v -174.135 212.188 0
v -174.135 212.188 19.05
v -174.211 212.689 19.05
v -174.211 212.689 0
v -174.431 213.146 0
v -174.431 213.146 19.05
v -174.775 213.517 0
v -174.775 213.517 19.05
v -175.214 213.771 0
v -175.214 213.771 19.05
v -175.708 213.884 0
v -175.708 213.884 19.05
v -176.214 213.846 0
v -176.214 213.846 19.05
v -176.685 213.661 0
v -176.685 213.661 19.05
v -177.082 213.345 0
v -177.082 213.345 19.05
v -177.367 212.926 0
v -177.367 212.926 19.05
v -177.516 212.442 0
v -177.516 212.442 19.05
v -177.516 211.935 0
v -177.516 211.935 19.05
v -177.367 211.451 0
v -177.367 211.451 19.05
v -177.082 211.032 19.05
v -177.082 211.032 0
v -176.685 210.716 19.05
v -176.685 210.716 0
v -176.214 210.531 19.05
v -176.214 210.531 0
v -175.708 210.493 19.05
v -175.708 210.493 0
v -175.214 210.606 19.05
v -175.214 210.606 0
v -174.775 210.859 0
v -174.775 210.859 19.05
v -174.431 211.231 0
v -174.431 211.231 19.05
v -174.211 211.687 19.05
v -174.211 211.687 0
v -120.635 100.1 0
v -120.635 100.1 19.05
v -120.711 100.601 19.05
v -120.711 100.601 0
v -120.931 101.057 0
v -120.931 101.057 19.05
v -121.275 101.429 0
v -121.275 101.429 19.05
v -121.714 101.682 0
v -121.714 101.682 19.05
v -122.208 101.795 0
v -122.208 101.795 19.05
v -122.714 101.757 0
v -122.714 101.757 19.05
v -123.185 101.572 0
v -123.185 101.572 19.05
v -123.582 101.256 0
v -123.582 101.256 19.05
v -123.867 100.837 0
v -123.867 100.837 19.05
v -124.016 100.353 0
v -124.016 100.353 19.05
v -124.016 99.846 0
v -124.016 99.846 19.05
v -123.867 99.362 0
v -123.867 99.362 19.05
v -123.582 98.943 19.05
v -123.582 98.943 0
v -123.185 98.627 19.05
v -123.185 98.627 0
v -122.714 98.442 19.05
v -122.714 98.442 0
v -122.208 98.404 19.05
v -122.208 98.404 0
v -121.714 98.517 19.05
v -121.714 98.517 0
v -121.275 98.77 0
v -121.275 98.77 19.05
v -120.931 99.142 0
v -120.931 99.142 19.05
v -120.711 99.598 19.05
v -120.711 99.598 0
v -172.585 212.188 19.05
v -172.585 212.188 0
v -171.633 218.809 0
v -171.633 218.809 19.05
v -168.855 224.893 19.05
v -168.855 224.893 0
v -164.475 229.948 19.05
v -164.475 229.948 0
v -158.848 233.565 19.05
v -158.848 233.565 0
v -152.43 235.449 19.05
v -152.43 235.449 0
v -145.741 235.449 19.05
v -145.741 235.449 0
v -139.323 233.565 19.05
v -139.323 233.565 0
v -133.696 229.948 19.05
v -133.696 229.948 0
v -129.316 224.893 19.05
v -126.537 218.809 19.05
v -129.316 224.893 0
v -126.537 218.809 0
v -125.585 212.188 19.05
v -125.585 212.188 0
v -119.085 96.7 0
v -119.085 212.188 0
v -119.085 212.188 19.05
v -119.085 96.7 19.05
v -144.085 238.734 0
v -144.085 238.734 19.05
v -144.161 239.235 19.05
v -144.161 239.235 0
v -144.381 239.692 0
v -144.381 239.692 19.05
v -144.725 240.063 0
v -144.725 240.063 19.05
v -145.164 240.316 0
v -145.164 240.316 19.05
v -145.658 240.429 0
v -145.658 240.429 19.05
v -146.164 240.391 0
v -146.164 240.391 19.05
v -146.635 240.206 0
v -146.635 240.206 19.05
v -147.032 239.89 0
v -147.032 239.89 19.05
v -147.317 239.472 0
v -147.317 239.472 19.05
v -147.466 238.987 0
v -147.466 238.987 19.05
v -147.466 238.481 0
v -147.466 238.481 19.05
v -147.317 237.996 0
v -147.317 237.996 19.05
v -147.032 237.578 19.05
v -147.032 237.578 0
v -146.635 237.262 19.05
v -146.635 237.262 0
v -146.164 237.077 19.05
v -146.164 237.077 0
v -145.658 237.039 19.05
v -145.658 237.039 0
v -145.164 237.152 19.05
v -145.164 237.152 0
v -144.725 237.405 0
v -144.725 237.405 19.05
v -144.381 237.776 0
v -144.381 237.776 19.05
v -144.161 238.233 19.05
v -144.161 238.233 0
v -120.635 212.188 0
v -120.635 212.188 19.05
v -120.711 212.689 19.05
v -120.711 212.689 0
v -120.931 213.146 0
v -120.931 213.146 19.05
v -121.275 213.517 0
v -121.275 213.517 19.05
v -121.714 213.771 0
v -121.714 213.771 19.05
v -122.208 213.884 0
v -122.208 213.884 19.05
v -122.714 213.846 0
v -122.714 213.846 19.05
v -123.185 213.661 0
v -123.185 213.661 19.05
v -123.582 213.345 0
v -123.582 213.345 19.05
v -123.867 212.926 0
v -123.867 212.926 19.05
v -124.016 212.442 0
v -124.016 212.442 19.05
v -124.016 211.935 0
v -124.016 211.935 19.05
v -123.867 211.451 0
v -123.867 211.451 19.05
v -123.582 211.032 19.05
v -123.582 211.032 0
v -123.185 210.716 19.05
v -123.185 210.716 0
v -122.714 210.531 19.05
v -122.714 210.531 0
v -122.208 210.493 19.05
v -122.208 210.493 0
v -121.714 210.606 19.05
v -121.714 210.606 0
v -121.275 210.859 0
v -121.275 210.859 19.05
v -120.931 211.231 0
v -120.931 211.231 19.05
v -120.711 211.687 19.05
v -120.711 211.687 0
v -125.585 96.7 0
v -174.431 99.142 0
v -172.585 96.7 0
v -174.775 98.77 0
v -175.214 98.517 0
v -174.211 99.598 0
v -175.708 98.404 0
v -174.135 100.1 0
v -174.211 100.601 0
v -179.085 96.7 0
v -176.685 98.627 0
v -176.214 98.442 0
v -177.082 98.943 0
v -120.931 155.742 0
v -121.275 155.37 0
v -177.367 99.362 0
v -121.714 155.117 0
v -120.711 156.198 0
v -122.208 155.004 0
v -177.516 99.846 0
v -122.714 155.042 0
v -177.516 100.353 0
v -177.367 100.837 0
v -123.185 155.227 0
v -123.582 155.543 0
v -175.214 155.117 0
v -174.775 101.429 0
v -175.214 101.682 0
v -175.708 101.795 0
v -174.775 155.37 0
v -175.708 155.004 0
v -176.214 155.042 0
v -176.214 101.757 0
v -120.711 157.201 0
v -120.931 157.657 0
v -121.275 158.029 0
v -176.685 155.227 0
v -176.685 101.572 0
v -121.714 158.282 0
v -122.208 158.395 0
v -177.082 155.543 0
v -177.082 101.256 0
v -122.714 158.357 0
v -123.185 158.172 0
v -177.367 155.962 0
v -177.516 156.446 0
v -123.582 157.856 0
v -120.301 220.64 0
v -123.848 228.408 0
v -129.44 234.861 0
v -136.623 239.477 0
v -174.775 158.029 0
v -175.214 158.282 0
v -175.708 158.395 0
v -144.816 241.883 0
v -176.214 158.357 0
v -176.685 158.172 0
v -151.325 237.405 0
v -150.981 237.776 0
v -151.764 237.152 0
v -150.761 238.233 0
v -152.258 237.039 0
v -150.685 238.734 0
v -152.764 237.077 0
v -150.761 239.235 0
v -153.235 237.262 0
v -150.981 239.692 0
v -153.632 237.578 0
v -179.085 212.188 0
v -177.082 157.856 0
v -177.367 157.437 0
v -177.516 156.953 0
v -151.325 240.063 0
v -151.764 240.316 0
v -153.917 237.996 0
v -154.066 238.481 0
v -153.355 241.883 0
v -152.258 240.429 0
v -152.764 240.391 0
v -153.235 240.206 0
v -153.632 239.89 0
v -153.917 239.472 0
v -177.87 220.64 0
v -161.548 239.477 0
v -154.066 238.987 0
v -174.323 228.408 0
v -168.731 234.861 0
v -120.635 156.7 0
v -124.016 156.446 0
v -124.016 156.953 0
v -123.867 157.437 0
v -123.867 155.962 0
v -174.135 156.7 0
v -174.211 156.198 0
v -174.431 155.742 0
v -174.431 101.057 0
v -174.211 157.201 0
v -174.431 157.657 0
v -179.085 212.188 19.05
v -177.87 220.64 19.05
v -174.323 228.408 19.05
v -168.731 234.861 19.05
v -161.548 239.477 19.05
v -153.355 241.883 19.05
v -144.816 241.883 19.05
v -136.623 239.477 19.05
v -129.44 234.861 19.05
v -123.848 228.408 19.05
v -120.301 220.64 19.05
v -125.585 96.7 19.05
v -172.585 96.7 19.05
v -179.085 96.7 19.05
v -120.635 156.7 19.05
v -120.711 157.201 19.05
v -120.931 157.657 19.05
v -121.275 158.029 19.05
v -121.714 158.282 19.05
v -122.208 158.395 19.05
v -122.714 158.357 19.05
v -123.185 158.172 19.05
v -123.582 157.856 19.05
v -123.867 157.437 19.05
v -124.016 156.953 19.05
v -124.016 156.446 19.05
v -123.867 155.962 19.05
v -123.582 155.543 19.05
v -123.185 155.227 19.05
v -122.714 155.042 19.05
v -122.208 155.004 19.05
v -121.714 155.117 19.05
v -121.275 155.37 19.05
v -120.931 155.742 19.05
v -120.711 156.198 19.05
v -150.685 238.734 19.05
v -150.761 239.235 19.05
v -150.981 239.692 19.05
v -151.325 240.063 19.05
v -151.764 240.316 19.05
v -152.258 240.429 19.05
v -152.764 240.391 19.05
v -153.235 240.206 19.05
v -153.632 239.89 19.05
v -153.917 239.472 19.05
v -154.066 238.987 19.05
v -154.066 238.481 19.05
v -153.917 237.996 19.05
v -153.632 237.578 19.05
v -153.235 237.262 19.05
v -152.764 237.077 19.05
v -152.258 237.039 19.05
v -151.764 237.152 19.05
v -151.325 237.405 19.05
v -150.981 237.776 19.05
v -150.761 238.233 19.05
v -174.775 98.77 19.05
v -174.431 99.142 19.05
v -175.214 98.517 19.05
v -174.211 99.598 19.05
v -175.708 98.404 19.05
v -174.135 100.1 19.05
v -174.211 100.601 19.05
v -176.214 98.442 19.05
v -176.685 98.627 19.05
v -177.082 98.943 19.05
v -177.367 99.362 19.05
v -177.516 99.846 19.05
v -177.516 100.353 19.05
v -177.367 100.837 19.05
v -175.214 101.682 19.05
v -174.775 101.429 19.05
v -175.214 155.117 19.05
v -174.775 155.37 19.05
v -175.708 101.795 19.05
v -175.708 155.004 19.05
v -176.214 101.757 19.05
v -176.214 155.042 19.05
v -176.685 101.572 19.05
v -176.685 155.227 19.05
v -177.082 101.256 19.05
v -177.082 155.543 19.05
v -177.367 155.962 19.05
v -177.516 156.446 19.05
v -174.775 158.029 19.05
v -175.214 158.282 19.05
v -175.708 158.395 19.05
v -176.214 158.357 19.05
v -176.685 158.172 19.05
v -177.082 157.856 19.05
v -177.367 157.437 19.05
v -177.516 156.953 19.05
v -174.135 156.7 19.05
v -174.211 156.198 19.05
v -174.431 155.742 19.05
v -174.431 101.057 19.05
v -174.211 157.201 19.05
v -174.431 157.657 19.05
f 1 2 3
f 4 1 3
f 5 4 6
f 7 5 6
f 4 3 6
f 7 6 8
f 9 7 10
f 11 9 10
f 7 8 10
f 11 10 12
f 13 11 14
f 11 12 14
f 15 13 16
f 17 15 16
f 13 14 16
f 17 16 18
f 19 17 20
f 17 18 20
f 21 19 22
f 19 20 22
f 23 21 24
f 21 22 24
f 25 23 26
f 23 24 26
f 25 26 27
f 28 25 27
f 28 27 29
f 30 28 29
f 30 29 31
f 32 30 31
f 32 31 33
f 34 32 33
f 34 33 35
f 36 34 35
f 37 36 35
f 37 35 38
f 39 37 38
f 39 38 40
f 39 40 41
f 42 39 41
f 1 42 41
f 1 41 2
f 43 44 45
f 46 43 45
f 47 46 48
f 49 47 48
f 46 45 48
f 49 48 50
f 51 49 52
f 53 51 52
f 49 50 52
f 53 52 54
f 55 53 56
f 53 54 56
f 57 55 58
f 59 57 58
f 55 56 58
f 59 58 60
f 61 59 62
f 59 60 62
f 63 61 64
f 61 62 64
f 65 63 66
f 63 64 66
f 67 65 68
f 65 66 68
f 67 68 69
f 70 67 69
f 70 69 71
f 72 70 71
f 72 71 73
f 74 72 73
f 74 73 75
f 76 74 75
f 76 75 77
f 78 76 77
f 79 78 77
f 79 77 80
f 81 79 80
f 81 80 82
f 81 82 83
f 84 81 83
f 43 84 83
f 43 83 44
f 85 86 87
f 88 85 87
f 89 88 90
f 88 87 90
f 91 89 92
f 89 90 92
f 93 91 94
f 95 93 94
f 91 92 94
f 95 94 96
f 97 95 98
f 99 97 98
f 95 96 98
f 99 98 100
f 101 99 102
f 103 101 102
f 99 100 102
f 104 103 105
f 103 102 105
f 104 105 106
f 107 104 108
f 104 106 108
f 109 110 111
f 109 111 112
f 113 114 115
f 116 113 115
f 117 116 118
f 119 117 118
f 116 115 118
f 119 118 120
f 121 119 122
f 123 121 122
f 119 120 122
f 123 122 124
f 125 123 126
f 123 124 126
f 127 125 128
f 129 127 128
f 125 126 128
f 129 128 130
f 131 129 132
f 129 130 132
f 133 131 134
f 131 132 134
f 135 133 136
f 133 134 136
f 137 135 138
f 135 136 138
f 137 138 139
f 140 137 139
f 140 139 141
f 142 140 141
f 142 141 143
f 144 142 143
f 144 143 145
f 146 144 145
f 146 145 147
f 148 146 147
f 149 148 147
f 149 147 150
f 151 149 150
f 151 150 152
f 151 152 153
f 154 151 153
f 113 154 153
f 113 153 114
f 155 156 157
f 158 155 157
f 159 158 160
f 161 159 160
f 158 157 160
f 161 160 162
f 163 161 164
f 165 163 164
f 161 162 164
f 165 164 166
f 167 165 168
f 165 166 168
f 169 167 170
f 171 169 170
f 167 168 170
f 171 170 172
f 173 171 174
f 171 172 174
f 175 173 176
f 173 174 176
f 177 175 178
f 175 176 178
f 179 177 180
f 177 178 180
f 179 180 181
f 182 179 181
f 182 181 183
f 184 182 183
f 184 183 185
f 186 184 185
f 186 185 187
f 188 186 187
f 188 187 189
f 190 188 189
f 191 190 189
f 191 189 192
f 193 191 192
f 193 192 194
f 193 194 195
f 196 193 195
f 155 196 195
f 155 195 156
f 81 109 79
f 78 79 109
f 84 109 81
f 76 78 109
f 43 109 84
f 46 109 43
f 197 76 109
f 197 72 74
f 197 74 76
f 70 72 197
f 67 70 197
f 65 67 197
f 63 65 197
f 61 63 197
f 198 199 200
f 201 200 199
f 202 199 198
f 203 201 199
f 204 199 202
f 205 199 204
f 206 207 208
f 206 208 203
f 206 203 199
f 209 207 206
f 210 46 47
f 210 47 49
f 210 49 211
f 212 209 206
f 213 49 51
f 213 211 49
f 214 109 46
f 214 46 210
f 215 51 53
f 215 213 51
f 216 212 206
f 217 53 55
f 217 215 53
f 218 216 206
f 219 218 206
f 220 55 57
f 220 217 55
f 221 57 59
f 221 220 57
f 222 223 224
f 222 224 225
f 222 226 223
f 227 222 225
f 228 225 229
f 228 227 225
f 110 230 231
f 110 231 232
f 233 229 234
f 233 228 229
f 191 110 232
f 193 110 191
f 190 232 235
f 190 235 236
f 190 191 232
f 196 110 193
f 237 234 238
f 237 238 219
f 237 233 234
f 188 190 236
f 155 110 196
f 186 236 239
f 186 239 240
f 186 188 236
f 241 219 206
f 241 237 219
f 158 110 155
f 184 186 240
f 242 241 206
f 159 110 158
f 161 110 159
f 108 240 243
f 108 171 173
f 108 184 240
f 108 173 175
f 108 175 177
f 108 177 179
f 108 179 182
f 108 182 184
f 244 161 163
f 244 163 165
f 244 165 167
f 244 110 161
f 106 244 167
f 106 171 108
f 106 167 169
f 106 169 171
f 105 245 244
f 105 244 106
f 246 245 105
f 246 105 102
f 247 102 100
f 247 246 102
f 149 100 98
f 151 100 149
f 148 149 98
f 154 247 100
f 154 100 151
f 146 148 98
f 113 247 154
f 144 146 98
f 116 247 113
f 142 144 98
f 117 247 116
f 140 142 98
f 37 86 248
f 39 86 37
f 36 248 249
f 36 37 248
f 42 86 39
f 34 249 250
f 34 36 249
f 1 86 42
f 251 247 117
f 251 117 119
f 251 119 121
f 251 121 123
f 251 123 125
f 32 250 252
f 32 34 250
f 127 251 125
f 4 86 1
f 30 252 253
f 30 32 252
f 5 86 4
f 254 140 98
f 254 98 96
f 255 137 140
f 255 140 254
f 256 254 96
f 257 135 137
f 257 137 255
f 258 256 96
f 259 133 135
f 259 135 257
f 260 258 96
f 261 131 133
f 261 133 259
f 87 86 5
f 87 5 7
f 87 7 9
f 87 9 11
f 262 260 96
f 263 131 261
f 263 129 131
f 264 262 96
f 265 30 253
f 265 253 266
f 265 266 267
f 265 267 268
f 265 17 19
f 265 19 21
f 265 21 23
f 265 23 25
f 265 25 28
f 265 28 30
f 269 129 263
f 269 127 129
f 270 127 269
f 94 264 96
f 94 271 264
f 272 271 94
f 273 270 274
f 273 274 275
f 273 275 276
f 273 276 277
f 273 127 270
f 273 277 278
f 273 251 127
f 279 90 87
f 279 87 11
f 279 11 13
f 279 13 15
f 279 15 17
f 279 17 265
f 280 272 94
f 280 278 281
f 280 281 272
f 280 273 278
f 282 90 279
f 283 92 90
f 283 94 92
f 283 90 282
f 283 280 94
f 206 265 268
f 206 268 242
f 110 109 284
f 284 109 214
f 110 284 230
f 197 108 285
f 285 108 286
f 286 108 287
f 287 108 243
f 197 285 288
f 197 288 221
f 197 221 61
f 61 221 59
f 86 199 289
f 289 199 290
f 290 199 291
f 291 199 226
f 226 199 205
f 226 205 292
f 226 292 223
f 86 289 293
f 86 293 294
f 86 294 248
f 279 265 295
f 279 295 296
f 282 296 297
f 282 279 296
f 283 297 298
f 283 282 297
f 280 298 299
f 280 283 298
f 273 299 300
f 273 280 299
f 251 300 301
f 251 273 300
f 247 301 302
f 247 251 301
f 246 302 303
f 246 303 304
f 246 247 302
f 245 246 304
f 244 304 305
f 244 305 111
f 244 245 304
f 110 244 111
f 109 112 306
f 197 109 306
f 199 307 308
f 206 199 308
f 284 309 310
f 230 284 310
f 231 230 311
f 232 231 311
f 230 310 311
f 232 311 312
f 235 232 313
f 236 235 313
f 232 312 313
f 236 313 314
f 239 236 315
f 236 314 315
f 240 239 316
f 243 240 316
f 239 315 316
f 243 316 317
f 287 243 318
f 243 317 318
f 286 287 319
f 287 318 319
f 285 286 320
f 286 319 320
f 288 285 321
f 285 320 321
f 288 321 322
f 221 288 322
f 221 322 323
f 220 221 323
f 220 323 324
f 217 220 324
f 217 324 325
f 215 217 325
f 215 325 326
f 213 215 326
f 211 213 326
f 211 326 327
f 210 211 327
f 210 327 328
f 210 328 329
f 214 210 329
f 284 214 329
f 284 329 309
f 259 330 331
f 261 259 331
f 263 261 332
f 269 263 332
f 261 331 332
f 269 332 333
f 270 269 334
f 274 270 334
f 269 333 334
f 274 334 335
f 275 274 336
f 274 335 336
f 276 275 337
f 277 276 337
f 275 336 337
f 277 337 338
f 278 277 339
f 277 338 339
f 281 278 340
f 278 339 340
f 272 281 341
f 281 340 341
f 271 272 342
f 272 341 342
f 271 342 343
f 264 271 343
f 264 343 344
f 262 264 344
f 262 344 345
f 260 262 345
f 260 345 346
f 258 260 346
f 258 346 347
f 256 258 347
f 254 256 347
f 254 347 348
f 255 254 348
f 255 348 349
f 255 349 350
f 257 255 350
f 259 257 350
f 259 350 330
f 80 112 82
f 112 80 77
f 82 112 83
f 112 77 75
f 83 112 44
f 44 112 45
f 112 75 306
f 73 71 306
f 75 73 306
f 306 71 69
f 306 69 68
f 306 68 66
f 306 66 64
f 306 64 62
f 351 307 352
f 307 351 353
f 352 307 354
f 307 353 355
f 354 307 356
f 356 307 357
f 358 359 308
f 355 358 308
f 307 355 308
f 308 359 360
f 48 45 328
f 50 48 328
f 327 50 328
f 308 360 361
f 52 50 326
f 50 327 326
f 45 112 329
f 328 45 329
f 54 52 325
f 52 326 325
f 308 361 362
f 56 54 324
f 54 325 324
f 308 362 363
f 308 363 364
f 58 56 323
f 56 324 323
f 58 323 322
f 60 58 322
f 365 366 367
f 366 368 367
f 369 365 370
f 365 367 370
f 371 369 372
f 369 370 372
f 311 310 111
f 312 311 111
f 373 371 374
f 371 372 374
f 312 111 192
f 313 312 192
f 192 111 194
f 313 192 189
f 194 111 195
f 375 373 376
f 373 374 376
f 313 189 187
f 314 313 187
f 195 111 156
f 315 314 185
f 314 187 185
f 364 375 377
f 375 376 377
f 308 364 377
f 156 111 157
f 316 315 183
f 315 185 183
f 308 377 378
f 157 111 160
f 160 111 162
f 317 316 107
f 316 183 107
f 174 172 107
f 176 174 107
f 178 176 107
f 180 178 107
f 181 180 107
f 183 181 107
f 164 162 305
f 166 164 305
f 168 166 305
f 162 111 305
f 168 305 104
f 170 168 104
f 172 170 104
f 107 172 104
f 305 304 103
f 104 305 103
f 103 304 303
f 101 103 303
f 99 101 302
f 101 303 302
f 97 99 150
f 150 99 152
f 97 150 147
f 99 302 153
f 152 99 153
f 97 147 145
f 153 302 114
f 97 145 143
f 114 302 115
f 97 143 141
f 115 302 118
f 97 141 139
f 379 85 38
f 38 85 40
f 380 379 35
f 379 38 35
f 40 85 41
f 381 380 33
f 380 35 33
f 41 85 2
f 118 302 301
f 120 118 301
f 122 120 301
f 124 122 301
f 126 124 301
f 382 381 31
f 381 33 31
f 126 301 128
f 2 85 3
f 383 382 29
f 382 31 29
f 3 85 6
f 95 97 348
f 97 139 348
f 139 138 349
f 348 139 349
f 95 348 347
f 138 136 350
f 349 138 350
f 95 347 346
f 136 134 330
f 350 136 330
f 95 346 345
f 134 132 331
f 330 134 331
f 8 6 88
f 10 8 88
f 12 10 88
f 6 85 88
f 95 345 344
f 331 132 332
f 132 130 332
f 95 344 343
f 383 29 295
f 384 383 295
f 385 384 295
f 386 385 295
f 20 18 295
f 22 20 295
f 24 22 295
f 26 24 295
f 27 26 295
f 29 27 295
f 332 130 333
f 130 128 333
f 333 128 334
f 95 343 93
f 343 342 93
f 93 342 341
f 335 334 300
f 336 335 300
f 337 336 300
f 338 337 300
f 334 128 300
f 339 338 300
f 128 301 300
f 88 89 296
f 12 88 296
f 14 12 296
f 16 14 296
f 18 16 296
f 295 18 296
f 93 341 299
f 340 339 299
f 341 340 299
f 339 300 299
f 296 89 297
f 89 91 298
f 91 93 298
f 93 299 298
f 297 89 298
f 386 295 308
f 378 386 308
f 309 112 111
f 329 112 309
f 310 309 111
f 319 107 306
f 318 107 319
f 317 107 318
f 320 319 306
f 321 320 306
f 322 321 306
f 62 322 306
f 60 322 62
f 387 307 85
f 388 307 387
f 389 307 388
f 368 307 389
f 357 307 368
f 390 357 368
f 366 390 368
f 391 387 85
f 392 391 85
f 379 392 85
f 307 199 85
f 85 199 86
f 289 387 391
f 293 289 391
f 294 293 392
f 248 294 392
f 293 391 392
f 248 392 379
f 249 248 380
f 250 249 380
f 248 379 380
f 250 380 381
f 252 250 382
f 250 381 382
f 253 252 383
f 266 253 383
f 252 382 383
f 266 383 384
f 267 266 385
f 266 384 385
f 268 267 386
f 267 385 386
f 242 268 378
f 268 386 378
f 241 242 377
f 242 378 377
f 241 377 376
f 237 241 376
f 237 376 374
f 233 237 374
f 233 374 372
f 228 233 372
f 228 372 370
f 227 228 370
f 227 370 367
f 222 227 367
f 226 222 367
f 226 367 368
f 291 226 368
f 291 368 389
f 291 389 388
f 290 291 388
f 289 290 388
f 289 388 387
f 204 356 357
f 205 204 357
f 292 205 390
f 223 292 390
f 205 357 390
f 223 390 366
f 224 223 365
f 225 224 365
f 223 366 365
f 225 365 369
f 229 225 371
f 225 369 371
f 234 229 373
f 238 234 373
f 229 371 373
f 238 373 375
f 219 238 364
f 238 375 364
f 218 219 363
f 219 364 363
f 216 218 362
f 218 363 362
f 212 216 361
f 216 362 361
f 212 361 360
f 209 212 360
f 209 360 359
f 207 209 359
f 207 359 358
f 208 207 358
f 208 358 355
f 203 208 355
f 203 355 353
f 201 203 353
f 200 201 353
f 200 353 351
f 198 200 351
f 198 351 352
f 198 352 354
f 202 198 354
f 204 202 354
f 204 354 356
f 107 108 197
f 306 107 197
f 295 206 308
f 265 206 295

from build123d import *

# Parameters (mm, degrees)
BOSS_EXTRUDE1_DEPTH = 19.05
SKETCH2_R           = 1.7
CUT_EXTRUDE1_DEPTH  = 20.05
CUT_EXTRUDE2_DEPTH  = 20.05


with BuildPart() as part:
    # Sketch1 → Boss-Extrude1 (new body)
    with BuildSketch(Plane.XY):
        with BuildLine():
            Line((-179.085368151, -18.789194183), (-179.085368151, 212.188334746))
            ThreePointArc((-179.085368151, 212.188334746), (-149.085368151, 242.188334746), (-119.085368151, 212.188334746))
            Line((-119.085368151, 212.188334746), (-119.085368151, -18.789194183))
            ThreePointArc((-119.085368151, -18.789194183), (-149.085368151, -48.789194183), (-179.085368151, -18.789194183))
        make_face()
        with BuildLine():
            Line((-172.585368151, -18.789194183), (-172.585368151, 212.188334746))
            ThreePointArc((-172.585368151, 212.188334746), (-149.085368151, 235.688334746), (-125.585368151, 212.188334746))
            Line((-125.585368151, 212.188334746), (-125.585368151, -18.789194183))
            ThreePointArc((-125.585368151, -18.789194183), (-149.085368151, -42.289194183), (-172.585368151, -18.789194183))
        make_face(mode=Mode.SUBTRACT)
    extrude(amount=BOSS_EXTRUDE1_DEPTH)

    # Sketch2 → Cut-Extrude1 (cut, through all)
    with BuildSketch(Plane.XY.offset(19.05)):
        with Locations((-145.785368151, 238.734002942)):
            Circle(SKETCH2_R)
        with Locations((-122.335368151, 212.188334746)):
            Circle(SKETCH2_R)
        with Locations((-152.485368151, -45.322239617)):
            Circle(SKETCH2_R)
        with Locations((-168.000474547, -37.70430058)):
            Circle(SKETCH2_R)
        with Locations((-175.835368151, -18.789194183)):
            Circle(SKETCH2_R)
        with Locations((-175.835368151, 212.188334746)):
            Circle(SKETCH2_R)
        with Locations((-145.685368151, -45.322239617)):
            Circle(SKETCH2_R)
        with Locations((-175.835368151, 100.099570281)):
            Circle(SKETCH2_R)
        with Locations((-175.835368151, 93.299570281)):
            Circle(SKETCH2_R)
        with Locations((-122.335368151, 100.099570281)):
            Circle(SKETCH2_R)
        with Locations((-122.335368151, 93.299570281)):
            Circle(SKETCH2_R)
        with Locations((-122.335368151, -18.789194183)):
            Circle(SKETCH2_R)
        with Locations((-130.170261754, -37.70430058)):
            Circle(SKETCH2_R)
        with Locations((-175.835368151, 156.699570281)):
            Circle(SKETCH2_R)
        with Locations((-122.335368151, 156.699570281)):
            Circle(SKETCH2_R)
        with Locations((-175.835368151, 66.699570281)):
            Circle(SKETCH2_R)
        with Locations((-122.335368151, 66.699570281)):
            Circle(SKETCH2_R)
        with Locations((-175.835368151, 36.699570281)):
            Circle(SKETCH2_R)
        with Locations((-122.335368151, 36.699570281)):
            Circle(SKETCH2_R)
        with Locations((-175.835368151, 6.699570281)):
            Circle(SKETCH2_R)
        with Locations((-122.335368151, 6.699570281)):
            Circle(SKETCH2_R)
        with Locations((-152.385368151, 238.734002942)):
            Circle(SKETCH2_R)
    extrude(amount=-CUT_EXTRUDE1_DEPTH, mode=Mode.SUBTRACT)

    # Sketch3 → Cut-Extrude2 (cut, through all)
    with BuildSketch(Plane.XY.offset(19.05)):
        Polygon((-149.085368151, 96.699570281), (-100.167336626, 96.699570281), (-100.167336626, -59.171887956), (-212.527814826, -59.171887956), (-212.527814826, 96.699570281), align=None)
    extrude(amount=-CUT_EXTRUDE2_DEPTH, mode=Mode.SUBTRACT)


solid = part.part
